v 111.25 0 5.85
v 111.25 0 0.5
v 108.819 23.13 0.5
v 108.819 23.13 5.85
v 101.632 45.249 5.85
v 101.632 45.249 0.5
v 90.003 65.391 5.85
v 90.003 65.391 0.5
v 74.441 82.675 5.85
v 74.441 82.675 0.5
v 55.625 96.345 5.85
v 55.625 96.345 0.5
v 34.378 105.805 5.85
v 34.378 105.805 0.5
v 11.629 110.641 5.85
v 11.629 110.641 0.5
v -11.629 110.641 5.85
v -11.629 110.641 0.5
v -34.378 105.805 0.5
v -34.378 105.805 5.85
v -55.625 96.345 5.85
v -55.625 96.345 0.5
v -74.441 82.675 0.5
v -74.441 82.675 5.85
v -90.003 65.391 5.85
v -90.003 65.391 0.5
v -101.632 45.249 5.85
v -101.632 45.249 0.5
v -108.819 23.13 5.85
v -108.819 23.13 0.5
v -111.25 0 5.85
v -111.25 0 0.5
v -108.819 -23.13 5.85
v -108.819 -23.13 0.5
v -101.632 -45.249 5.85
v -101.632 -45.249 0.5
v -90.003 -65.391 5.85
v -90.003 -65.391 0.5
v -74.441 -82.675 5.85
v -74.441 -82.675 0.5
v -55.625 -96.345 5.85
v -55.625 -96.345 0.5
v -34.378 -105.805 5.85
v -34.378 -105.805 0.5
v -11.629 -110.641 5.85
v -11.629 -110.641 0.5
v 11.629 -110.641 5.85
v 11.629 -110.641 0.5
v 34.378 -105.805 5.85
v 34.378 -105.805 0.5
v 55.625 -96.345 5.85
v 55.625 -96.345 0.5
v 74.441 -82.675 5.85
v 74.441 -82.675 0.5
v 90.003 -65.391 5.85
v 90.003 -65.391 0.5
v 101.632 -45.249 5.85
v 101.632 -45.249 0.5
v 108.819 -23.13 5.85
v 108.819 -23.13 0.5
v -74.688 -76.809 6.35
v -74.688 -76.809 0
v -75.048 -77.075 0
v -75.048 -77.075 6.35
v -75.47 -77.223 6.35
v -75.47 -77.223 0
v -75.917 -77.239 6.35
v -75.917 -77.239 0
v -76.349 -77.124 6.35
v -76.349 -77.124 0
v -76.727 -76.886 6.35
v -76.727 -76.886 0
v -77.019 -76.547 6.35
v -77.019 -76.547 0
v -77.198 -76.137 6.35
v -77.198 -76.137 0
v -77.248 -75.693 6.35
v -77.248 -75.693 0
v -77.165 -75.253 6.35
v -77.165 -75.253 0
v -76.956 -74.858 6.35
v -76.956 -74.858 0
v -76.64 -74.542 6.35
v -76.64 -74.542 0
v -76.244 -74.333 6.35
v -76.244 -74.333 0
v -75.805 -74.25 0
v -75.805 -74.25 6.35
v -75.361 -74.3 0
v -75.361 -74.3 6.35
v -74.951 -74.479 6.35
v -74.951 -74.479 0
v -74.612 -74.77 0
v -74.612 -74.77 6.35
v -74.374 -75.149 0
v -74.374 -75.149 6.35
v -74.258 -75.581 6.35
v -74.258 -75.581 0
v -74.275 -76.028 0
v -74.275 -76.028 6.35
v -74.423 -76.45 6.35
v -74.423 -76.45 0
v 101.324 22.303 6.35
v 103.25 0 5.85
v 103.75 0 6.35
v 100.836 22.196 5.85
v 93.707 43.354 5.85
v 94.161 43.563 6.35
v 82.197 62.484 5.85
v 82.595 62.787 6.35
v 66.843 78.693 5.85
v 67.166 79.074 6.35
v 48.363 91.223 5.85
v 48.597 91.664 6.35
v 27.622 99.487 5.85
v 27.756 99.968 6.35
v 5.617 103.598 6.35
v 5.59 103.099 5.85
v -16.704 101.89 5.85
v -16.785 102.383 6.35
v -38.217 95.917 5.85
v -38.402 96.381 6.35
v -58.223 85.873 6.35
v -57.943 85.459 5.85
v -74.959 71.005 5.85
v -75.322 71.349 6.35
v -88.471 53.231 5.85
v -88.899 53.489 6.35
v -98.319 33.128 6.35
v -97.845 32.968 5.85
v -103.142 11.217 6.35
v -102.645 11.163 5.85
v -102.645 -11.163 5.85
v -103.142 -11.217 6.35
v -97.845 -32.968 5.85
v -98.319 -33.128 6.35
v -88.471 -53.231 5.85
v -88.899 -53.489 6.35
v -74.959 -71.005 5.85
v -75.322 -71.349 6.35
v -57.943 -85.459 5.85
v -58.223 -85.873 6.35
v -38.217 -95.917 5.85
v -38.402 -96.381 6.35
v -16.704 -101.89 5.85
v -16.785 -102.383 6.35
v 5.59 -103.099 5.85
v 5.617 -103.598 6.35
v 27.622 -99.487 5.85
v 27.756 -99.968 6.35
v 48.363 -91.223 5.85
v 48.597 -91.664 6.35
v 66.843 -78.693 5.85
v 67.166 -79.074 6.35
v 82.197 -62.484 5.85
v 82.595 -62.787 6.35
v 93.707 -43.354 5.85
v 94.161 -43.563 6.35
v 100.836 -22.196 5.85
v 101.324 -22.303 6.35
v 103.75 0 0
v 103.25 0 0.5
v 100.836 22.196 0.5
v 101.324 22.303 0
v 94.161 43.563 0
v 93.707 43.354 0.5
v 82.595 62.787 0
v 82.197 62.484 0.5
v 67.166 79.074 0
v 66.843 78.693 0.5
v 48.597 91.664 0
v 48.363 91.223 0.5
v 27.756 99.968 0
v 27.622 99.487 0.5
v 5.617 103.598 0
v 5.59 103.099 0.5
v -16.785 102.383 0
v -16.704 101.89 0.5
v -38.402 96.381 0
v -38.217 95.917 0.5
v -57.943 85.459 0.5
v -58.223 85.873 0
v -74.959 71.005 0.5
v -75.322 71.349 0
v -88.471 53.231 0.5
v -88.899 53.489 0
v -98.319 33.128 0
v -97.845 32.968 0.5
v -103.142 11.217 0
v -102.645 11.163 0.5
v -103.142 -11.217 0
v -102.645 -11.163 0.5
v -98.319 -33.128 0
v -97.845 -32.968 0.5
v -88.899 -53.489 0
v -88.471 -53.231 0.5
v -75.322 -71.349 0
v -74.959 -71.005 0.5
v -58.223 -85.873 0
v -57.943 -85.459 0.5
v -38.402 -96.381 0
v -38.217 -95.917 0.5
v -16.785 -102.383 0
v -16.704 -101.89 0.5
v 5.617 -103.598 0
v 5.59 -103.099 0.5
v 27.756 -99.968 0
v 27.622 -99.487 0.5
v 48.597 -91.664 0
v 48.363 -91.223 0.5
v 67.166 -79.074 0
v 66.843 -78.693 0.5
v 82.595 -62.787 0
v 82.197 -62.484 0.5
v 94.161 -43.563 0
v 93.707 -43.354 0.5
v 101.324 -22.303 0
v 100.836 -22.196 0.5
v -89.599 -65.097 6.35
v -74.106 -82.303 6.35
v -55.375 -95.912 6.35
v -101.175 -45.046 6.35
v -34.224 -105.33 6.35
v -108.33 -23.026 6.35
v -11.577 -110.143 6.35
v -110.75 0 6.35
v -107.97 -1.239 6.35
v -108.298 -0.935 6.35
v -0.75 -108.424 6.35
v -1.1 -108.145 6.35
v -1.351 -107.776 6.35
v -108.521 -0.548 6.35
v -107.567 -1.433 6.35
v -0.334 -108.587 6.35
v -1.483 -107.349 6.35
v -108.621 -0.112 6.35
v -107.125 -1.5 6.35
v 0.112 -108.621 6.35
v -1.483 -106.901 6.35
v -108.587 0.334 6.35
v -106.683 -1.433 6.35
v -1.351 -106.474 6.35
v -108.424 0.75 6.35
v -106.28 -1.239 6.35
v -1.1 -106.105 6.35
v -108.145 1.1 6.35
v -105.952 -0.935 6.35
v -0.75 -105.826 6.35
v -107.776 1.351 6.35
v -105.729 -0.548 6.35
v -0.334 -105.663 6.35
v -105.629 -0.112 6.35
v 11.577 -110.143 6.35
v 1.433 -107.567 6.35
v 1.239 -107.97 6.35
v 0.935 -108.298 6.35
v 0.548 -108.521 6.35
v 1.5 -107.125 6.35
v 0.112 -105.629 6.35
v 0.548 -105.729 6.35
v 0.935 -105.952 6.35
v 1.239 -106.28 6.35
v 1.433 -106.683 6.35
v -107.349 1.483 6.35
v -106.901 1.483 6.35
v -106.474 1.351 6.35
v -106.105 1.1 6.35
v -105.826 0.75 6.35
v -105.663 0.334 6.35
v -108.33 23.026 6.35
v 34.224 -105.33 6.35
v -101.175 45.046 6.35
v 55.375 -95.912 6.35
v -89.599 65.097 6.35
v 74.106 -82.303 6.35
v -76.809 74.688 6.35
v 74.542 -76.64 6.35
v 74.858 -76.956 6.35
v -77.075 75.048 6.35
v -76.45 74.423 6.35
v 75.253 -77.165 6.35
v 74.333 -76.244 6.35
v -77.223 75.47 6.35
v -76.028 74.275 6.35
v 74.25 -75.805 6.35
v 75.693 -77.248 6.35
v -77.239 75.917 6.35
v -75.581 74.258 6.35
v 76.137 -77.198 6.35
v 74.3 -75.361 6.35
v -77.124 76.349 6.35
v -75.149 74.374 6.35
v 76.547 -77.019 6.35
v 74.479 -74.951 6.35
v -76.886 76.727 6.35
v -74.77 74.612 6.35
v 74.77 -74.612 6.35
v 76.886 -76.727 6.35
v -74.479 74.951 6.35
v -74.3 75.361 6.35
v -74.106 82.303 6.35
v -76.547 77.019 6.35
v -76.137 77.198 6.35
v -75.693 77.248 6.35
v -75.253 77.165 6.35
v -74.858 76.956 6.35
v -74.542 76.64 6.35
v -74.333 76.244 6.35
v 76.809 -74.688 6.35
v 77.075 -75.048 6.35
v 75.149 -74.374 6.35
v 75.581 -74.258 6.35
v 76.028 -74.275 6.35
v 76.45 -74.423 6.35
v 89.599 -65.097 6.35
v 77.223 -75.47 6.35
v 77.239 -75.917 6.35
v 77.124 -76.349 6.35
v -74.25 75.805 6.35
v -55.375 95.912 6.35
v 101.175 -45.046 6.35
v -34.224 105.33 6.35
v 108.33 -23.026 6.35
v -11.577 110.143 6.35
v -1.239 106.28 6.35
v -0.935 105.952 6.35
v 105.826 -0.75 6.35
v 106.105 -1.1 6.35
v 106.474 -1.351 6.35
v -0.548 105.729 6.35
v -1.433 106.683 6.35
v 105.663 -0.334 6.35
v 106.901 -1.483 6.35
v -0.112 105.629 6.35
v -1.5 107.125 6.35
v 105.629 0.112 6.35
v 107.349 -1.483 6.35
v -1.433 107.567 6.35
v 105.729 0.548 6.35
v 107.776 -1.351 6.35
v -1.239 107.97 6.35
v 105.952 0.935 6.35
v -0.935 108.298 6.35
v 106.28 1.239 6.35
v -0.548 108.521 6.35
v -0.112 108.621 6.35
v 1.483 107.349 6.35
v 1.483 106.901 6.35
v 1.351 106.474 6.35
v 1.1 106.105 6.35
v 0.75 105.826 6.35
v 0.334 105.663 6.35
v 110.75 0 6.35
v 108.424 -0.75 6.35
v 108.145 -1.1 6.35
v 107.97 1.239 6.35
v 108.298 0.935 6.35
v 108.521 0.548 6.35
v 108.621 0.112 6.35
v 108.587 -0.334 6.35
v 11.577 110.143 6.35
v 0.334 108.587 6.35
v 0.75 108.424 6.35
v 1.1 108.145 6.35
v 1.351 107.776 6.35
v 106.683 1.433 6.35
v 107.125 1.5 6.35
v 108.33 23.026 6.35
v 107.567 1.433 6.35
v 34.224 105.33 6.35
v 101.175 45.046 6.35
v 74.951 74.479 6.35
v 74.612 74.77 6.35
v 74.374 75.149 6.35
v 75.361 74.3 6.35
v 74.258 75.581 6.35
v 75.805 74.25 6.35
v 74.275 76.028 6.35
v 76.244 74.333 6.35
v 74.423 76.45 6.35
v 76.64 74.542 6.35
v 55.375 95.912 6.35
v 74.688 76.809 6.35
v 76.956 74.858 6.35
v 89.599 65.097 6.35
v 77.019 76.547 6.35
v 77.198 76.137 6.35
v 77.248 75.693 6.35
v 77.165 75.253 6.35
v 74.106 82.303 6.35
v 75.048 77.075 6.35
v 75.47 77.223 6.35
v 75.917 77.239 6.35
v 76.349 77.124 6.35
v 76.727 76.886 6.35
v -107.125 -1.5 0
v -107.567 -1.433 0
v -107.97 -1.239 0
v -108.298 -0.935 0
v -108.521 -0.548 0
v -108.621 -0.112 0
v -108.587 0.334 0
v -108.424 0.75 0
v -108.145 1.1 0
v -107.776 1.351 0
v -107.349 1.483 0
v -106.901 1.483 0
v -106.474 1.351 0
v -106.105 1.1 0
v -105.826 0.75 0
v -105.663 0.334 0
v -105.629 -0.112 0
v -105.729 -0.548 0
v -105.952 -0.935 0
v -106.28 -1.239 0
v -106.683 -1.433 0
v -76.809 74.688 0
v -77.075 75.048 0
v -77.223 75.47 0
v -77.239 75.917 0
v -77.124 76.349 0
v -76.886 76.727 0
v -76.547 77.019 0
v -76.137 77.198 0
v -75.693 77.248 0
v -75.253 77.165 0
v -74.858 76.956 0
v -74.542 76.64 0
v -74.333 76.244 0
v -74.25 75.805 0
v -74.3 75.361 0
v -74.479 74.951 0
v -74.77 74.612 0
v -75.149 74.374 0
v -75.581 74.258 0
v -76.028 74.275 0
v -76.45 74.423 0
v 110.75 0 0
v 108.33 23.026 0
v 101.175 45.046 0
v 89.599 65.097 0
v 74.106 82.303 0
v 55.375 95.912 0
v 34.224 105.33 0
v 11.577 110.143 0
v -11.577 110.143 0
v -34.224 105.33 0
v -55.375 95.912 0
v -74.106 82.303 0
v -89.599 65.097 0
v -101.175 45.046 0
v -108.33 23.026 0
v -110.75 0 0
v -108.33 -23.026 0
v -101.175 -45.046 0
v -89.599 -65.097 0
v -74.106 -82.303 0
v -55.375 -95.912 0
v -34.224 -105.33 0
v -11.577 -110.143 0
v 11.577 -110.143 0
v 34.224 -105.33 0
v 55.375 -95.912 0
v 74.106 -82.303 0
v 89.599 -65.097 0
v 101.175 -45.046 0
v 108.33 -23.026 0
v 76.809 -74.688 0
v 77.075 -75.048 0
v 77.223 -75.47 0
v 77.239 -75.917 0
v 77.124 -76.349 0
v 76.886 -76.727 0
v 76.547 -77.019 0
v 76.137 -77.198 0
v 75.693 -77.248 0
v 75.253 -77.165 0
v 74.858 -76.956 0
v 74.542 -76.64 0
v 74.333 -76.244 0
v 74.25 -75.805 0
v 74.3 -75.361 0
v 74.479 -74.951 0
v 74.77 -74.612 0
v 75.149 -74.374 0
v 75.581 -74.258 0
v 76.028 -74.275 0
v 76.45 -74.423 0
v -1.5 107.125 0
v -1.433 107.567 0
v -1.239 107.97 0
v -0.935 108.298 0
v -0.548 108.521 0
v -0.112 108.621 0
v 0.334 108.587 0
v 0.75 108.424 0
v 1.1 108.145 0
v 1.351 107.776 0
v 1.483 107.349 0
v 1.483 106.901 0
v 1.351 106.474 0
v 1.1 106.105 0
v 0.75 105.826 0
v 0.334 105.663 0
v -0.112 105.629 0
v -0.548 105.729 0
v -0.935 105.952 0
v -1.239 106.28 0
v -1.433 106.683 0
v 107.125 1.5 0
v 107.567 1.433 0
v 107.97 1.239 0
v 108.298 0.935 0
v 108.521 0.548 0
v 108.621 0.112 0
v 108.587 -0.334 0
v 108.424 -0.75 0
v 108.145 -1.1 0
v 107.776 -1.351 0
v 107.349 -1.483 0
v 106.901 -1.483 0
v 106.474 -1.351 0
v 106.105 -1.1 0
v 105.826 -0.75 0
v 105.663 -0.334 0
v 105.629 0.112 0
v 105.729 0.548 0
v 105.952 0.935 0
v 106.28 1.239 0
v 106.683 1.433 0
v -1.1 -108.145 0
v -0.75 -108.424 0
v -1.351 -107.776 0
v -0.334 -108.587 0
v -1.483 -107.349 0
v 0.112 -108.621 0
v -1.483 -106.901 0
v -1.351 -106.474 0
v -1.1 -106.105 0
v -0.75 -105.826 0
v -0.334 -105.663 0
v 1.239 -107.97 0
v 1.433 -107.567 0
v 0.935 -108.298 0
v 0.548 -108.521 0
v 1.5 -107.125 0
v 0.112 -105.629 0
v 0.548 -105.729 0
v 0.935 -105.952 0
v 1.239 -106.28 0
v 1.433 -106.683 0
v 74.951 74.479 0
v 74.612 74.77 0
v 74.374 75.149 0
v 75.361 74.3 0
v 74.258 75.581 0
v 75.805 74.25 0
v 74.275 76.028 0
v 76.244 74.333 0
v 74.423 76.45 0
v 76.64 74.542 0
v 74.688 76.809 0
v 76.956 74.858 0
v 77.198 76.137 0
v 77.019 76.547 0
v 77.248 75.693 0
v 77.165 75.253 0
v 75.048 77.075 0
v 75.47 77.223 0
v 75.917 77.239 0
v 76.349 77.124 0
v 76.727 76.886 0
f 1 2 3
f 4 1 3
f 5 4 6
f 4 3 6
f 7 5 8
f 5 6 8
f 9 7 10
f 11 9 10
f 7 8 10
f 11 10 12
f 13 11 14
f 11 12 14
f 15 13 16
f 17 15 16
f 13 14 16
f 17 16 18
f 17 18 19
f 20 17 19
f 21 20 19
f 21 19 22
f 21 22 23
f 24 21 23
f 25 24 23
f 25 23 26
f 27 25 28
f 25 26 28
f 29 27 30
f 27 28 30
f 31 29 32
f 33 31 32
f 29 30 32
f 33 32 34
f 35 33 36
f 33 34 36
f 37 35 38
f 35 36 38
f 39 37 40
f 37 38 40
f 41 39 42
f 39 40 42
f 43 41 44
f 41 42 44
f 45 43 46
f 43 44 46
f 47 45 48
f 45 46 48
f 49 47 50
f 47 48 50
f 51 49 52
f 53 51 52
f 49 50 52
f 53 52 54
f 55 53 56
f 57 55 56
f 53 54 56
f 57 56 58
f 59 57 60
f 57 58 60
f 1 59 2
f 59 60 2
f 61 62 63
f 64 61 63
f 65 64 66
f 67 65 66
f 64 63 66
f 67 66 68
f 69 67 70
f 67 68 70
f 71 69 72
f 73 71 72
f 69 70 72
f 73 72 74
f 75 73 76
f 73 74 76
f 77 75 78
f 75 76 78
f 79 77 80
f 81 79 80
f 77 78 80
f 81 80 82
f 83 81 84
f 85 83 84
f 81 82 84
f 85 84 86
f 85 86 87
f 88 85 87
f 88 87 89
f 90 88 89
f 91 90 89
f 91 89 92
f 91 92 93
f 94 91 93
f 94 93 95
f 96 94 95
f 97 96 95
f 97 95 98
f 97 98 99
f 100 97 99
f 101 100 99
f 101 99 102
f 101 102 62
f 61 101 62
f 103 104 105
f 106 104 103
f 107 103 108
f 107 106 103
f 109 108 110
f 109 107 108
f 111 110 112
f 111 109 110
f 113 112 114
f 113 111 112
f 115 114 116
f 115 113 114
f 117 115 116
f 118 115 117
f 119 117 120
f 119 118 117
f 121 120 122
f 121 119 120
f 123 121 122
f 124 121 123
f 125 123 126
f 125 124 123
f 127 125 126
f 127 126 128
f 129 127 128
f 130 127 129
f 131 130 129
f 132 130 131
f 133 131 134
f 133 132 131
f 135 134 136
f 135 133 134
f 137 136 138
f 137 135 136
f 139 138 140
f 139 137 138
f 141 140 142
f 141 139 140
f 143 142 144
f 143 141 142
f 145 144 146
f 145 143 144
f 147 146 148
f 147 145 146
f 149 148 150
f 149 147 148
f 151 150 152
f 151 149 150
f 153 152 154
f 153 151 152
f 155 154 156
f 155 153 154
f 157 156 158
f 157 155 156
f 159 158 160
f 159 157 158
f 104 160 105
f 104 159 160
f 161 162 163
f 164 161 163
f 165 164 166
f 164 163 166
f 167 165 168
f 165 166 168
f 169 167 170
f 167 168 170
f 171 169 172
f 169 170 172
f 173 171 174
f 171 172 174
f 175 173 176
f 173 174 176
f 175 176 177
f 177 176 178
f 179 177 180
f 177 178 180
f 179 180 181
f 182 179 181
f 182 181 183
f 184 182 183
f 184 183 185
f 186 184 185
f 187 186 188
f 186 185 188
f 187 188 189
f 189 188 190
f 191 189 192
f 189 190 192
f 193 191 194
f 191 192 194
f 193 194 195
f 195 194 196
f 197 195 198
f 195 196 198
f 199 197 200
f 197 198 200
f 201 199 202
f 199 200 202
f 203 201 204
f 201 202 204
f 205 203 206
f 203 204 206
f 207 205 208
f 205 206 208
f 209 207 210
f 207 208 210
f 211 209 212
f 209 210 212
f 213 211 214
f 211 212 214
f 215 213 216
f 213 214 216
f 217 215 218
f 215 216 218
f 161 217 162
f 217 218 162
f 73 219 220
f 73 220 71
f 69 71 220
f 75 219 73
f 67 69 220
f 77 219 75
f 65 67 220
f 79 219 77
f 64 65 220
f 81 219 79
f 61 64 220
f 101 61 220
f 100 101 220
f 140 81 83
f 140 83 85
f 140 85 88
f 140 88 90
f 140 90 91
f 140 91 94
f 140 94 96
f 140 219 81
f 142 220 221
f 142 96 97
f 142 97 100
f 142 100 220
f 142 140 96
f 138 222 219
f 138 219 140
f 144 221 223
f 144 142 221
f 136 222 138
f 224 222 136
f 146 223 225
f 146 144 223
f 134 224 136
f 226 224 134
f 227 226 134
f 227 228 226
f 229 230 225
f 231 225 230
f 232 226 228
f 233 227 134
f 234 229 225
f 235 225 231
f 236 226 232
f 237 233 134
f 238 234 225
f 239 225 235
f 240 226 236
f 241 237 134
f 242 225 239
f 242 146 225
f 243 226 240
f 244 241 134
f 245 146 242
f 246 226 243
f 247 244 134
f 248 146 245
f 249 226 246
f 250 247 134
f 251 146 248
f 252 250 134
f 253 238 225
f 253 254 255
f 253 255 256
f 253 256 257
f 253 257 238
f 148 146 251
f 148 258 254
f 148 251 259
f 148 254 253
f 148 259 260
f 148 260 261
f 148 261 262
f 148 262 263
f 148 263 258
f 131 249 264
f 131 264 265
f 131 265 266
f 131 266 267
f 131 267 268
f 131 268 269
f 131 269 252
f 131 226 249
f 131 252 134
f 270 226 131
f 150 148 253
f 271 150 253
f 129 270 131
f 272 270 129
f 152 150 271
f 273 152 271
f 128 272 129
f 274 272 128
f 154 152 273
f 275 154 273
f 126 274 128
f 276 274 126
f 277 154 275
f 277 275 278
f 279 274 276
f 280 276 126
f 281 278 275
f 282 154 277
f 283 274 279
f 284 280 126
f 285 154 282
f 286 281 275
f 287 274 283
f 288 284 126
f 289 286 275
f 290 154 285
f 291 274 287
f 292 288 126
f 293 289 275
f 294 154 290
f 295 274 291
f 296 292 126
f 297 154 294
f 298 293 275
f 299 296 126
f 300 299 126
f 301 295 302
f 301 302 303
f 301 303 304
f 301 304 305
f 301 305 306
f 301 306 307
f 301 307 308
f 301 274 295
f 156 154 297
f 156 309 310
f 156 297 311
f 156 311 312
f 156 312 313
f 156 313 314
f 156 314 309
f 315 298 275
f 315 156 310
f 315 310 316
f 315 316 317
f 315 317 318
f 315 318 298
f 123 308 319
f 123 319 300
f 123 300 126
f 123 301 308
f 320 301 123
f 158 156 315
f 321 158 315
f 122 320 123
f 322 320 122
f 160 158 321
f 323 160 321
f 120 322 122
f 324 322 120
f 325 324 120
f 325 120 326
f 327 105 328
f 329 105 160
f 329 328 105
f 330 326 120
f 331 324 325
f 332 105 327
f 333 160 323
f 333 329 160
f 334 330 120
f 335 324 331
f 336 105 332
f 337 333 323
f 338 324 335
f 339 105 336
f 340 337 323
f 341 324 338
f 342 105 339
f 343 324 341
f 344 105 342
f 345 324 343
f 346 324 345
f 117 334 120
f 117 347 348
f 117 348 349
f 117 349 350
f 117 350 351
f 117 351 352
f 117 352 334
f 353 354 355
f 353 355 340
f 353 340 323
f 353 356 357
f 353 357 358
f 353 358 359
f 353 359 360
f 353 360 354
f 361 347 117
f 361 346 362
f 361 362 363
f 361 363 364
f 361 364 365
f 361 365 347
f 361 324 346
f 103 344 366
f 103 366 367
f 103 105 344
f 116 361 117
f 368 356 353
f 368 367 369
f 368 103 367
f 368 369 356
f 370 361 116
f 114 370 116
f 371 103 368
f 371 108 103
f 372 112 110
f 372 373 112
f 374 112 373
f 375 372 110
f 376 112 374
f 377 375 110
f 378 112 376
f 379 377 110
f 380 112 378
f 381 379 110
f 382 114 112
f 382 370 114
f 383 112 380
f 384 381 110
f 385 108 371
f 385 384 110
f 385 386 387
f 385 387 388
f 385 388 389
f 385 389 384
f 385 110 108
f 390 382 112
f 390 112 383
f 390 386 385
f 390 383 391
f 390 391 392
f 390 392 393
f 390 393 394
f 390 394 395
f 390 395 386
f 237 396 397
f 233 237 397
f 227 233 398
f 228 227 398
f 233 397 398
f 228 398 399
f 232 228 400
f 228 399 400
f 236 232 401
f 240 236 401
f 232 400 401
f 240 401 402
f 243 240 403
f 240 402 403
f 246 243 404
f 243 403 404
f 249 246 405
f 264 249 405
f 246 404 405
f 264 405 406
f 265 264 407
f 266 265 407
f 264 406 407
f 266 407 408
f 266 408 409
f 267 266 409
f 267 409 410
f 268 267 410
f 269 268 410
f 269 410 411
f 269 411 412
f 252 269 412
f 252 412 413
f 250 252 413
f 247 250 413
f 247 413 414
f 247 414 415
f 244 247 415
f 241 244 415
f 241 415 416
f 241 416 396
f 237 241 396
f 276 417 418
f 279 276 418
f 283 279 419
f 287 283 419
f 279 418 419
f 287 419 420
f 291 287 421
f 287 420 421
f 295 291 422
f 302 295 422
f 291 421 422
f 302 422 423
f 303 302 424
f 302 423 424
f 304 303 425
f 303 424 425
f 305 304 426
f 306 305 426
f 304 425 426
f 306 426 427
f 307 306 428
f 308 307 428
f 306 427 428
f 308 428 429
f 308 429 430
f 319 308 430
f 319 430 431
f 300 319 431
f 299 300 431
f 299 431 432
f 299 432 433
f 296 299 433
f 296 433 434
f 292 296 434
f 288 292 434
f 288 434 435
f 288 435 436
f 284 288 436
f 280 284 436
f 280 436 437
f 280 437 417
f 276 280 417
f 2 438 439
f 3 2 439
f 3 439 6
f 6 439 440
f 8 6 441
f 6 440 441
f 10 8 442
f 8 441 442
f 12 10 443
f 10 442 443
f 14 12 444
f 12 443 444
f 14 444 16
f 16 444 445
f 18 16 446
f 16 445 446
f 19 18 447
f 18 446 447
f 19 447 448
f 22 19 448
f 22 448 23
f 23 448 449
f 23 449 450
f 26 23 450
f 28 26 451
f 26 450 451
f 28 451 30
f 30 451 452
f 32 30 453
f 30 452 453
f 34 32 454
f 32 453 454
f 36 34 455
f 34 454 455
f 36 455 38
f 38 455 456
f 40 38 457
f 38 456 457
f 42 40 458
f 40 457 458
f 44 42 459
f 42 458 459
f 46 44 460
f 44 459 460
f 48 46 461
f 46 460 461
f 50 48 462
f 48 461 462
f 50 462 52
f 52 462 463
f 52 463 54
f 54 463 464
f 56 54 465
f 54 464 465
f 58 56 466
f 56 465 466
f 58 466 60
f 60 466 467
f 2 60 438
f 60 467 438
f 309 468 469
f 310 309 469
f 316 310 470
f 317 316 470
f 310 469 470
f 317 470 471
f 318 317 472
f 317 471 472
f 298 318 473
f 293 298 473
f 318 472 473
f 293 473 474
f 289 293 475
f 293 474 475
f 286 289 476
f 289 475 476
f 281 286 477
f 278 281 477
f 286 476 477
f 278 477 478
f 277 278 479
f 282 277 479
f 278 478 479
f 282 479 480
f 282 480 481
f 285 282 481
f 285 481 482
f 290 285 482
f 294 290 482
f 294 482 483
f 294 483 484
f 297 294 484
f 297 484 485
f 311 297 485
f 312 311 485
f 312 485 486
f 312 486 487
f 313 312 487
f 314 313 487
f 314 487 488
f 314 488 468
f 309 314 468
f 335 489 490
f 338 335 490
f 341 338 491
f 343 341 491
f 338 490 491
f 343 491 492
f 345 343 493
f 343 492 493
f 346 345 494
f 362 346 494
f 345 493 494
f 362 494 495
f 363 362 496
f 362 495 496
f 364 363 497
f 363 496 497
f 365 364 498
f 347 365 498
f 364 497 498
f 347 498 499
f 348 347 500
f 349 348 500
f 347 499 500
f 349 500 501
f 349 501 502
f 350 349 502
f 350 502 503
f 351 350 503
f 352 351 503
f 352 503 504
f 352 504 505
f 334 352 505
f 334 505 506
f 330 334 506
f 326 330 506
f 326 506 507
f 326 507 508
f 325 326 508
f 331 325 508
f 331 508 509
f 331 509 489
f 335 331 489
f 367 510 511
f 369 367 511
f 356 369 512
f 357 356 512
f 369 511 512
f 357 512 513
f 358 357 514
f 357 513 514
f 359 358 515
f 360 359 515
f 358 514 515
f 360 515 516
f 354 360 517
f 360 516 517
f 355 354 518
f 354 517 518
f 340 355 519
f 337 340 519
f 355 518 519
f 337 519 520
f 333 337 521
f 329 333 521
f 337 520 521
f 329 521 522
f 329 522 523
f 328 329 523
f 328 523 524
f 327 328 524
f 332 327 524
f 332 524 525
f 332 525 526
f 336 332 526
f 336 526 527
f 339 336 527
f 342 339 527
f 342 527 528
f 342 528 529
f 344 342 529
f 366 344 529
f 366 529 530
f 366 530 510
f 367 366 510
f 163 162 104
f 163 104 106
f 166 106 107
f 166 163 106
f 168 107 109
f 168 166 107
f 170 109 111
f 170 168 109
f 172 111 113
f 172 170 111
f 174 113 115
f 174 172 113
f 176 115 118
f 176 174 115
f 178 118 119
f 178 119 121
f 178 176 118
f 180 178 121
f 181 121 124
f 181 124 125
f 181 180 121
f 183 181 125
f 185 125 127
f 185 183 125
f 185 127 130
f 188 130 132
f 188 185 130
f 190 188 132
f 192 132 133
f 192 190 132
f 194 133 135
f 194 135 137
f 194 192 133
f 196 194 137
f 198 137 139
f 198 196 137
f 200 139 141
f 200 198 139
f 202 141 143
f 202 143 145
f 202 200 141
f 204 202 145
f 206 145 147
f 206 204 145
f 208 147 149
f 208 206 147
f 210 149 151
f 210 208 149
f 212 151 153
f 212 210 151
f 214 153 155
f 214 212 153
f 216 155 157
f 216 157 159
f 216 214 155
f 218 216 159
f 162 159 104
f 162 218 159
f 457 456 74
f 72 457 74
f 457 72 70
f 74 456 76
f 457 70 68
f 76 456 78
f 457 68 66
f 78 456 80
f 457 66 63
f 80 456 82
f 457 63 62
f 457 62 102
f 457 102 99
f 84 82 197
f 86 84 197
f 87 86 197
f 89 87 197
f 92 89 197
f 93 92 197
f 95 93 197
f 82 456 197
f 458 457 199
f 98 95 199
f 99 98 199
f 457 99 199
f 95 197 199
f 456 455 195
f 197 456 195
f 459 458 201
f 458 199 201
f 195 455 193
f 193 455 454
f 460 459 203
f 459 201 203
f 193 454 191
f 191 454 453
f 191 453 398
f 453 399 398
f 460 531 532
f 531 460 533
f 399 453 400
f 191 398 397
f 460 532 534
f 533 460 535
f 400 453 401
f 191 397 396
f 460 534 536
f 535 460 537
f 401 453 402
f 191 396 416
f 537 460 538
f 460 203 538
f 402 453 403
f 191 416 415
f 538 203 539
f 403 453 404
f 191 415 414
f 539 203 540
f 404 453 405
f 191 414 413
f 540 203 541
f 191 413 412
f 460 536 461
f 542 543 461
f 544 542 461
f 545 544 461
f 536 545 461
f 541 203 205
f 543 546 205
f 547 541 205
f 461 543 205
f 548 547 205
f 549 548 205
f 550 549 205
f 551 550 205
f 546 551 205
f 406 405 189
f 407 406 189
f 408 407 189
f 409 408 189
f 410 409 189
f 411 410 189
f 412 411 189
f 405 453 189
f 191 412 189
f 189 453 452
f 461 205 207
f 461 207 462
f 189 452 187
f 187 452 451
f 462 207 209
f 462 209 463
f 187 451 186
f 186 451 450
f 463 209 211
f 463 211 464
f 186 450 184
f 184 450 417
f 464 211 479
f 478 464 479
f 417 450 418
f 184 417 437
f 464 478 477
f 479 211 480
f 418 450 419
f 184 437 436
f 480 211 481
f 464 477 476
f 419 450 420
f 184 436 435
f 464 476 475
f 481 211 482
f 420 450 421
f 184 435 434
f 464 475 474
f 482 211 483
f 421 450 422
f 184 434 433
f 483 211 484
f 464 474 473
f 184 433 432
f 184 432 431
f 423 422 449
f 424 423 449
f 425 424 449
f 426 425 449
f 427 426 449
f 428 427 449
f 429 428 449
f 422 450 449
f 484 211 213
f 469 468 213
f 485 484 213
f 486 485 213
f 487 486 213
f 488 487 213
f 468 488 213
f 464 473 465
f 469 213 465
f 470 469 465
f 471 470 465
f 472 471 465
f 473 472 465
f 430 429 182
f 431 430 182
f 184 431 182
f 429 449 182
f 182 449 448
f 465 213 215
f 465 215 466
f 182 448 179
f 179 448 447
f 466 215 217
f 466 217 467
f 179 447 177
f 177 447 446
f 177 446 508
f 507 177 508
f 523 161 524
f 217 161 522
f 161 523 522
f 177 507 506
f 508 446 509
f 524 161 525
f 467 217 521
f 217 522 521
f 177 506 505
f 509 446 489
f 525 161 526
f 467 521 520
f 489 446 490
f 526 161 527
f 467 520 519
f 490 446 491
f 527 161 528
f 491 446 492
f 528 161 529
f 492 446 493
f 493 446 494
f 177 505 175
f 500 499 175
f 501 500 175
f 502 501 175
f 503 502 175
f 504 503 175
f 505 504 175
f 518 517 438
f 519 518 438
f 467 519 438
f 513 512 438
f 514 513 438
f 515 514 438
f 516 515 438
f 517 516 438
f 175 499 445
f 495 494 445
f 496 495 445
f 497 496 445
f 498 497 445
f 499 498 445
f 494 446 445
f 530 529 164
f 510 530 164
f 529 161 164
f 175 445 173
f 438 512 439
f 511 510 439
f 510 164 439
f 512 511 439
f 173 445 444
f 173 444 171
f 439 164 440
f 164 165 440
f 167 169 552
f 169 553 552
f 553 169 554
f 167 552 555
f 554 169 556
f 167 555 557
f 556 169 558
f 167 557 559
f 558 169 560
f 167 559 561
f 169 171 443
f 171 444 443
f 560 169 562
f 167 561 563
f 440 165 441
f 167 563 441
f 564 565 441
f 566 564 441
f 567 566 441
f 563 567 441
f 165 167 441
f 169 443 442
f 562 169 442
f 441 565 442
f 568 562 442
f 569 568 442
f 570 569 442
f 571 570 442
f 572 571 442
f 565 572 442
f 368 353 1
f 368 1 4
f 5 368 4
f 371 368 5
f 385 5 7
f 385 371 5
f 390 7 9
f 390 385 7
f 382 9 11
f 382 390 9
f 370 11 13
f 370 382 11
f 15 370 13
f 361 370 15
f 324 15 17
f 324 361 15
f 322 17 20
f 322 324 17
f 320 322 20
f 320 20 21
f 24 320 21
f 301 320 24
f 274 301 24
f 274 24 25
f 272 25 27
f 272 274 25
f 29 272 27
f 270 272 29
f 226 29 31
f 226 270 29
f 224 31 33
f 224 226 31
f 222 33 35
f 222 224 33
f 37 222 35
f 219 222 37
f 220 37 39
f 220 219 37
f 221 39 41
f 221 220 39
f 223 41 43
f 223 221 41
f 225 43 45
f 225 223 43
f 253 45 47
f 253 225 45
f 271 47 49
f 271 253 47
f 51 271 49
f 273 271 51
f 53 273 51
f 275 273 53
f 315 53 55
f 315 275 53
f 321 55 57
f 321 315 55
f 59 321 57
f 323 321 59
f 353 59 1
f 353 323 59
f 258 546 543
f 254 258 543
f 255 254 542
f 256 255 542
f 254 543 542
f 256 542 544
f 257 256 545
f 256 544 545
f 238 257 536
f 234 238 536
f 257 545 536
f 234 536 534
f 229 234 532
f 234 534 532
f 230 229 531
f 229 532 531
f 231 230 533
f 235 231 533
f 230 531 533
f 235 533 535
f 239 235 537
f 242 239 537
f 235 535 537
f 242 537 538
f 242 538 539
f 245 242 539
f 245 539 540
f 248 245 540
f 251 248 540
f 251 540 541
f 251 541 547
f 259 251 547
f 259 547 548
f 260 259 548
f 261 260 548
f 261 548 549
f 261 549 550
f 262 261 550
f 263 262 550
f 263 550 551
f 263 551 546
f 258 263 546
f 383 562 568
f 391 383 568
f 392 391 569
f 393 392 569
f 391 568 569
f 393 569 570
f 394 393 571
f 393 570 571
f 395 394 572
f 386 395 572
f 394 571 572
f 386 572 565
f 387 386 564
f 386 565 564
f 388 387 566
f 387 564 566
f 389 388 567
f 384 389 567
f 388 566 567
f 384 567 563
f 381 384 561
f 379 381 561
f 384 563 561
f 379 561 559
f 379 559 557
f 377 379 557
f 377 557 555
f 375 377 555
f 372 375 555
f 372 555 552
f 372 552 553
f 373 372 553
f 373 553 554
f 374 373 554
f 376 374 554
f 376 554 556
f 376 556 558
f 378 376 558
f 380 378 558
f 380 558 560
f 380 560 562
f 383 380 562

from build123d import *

# Parameters (mm, degrees)
SKETCH1_R             = 111.25
SKETCH1_R_2           = 103.25
EXTRUDE1_DEPTH        = 6.35
M3X0_5_TAPPED_HOLE1_D = 3
CIRPATTERN1_COUNT     = 8
CHAMFER1_SIZE         = 0.5


with BuildPart() as part:
    # Sketch1 → Extrude1 (new body)
    with BuildSketch(Plane.XY):
        Circle(SKETCH1_R)
        Circle(SKETCH1_R_2, mode=Mode.SUBTRACT)
    extrude(amount=EXTRUDE1_DEPTH)

    # M3x0.5 Tapped Hole1 (through all)
    with Locations(Plane.XY.offset(6.35)):
        with Locations((0, 107.125)):
            m3x0_5_tapped_hole1 = Hole(M3X0_5_TAPPED_HOLE1_D / 2)

    # CirPattern1: M3x0.5 Tapped Hole1 ×8 about axis
    cirpattern1_axis = Axis((0, 0, 0), (0, 0, 1))
    for i in range(1, CIRPATTERN1_COUNT):
        add(m3x0_5_tapped_hole1.rotate(cirpattern1_axis, i * 360 / CIRPATTERN1_COUNT), mode=Mode.SUBTRACT)

    # Chamfer1
    chamfer1_edges = [part.edges().sort_by_distance(p)[0] for p in [
        (-111.25, 0, 0),
        (-111.25, 0, 6.35),
        (-103.25, 0, 0),
        (-103.25, 0, 6.35),
    ]]
    chamfer(chamfer1_edges, length=CHAMFER1_SIZE)


solid = part.part
